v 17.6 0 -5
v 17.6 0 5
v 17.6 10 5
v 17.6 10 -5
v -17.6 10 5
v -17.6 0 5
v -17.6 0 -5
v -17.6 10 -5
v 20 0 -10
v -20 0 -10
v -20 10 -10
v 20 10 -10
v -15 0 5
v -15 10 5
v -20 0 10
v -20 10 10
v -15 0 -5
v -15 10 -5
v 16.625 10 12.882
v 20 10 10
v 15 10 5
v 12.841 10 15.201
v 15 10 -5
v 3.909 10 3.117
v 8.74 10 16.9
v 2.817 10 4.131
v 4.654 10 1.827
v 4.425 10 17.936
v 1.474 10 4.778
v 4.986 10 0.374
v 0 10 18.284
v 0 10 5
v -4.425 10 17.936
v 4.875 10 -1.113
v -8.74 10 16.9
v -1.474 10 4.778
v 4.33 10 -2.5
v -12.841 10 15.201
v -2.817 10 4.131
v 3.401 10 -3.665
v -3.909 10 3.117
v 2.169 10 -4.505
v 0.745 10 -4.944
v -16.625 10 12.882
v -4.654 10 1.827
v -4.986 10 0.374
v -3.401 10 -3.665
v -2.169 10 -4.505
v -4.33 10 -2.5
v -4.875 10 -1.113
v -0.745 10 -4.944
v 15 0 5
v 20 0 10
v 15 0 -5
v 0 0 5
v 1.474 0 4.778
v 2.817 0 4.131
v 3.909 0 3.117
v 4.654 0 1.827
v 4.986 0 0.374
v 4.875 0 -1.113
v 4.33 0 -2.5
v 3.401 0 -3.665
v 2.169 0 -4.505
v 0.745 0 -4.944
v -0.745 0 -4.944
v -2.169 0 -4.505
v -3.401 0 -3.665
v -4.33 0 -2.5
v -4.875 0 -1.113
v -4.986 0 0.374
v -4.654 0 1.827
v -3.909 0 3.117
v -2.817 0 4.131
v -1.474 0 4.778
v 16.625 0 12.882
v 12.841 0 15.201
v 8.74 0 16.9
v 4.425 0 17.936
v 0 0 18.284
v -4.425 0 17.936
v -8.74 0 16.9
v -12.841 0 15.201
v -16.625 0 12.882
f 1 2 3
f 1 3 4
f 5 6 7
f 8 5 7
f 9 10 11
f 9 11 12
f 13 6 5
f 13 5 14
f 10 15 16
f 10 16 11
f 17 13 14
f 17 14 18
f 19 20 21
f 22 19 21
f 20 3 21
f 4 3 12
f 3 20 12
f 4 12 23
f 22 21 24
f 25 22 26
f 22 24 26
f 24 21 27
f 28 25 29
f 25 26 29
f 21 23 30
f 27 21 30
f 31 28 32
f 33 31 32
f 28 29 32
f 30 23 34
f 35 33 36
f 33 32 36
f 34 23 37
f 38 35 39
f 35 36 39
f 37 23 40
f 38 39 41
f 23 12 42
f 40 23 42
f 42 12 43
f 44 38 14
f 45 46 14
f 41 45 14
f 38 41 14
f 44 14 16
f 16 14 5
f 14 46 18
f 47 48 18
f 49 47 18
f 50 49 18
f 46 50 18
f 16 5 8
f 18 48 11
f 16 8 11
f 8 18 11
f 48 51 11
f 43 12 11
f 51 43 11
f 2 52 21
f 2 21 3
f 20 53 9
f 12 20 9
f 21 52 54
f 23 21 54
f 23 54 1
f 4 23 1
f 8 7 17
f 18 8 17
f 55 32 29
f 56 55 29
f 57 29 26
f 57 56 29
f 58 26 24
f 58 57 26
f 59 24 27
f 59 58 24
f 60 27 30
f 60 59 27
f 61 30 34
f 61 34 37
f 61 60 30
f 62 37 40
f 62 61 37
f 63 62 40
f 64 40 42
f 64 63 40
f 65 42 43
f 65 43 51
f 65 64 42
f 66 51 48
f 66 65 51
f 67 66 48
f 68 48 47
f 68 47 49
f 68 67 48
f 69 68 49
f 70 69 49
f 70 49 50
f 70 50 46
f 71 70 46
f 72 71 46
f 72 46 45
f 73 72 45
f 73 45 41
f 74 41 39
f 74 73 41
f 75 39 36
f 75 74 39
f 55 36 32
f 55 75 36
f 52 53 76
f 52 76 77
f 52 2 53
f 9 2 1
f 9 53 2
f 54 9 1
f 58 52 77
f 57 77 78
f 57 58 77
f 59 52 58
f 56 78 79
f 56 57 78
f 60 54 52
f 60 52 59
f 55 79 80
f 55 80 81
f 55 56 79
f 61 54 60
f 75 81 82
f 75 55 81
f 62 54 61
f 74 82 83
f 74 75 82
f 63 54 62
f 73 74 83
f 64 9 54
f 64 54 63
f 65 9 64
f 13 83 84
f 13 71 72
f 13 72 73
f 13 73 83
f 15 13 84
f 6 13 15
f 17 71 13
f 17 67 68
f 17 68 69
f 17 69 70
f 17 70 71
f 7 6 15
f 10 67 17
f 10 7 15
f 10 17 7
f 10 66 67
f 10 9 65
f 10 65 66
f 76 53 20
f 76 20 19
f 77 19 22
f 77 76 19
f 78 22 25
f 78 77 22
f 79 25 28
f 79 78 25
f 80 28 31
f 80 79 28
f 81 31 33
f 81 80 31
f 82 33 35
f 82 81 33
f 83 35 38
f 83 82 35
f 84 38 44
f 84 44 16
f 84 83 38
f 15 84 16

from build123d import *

# Parameters (mm, degrees)
SKETCH1_W           = 40
SKETCH1_H           = 20
SKETCH1_R           = 5
SKETCH1_W_2         = 2.6
SKETCH1_H_2         = 10
BOSS_EXTRUDE1_DEPTH = 10


with BuildPart() as part:
    # Sketch1 → Boss-Extrude1 (new body)
    # profile 1 of 2: a face of its own
    with BuildSketch(Plane(origin=(0, 0, 0), x_dir=(1, 0, 0), z_dir=(0, 1, 0))):
        Rectangle(SKETCH1_W, SKETCH1_H)
        with Locations(Location((0, 0, 0), (0, 0, 270))):
            Circle(SKETCH1_R, mode=Mode.SUBTRACT)
        with Locations((16.3, 0)):
            Rectangle(SKETCH1_W_2, SKETCH1_H_2, mode=Mode.SUBTRACT)
        with Locations((-16.3, 0)):
            Rectangle(SKETCH1_W_2, SKETCH1_H_2, mode=Mode.SUBTRACT)
    # profile 2 of 2: a face of its own
    with BuildSketch(Plane(origin=(0, 0, 0), x_dir=(1, 0, 0), z_dir=(0, 1, 0))):
        with BuildLine():
            Line((-20, -10), (20, -10))
            ThreePointArc((20, -10), (0, -18.284271247), (-20, -10))
        make_face()
    extrude(amount=BOSS_EXTRUDE1_DEPTH)


solid = part.part
